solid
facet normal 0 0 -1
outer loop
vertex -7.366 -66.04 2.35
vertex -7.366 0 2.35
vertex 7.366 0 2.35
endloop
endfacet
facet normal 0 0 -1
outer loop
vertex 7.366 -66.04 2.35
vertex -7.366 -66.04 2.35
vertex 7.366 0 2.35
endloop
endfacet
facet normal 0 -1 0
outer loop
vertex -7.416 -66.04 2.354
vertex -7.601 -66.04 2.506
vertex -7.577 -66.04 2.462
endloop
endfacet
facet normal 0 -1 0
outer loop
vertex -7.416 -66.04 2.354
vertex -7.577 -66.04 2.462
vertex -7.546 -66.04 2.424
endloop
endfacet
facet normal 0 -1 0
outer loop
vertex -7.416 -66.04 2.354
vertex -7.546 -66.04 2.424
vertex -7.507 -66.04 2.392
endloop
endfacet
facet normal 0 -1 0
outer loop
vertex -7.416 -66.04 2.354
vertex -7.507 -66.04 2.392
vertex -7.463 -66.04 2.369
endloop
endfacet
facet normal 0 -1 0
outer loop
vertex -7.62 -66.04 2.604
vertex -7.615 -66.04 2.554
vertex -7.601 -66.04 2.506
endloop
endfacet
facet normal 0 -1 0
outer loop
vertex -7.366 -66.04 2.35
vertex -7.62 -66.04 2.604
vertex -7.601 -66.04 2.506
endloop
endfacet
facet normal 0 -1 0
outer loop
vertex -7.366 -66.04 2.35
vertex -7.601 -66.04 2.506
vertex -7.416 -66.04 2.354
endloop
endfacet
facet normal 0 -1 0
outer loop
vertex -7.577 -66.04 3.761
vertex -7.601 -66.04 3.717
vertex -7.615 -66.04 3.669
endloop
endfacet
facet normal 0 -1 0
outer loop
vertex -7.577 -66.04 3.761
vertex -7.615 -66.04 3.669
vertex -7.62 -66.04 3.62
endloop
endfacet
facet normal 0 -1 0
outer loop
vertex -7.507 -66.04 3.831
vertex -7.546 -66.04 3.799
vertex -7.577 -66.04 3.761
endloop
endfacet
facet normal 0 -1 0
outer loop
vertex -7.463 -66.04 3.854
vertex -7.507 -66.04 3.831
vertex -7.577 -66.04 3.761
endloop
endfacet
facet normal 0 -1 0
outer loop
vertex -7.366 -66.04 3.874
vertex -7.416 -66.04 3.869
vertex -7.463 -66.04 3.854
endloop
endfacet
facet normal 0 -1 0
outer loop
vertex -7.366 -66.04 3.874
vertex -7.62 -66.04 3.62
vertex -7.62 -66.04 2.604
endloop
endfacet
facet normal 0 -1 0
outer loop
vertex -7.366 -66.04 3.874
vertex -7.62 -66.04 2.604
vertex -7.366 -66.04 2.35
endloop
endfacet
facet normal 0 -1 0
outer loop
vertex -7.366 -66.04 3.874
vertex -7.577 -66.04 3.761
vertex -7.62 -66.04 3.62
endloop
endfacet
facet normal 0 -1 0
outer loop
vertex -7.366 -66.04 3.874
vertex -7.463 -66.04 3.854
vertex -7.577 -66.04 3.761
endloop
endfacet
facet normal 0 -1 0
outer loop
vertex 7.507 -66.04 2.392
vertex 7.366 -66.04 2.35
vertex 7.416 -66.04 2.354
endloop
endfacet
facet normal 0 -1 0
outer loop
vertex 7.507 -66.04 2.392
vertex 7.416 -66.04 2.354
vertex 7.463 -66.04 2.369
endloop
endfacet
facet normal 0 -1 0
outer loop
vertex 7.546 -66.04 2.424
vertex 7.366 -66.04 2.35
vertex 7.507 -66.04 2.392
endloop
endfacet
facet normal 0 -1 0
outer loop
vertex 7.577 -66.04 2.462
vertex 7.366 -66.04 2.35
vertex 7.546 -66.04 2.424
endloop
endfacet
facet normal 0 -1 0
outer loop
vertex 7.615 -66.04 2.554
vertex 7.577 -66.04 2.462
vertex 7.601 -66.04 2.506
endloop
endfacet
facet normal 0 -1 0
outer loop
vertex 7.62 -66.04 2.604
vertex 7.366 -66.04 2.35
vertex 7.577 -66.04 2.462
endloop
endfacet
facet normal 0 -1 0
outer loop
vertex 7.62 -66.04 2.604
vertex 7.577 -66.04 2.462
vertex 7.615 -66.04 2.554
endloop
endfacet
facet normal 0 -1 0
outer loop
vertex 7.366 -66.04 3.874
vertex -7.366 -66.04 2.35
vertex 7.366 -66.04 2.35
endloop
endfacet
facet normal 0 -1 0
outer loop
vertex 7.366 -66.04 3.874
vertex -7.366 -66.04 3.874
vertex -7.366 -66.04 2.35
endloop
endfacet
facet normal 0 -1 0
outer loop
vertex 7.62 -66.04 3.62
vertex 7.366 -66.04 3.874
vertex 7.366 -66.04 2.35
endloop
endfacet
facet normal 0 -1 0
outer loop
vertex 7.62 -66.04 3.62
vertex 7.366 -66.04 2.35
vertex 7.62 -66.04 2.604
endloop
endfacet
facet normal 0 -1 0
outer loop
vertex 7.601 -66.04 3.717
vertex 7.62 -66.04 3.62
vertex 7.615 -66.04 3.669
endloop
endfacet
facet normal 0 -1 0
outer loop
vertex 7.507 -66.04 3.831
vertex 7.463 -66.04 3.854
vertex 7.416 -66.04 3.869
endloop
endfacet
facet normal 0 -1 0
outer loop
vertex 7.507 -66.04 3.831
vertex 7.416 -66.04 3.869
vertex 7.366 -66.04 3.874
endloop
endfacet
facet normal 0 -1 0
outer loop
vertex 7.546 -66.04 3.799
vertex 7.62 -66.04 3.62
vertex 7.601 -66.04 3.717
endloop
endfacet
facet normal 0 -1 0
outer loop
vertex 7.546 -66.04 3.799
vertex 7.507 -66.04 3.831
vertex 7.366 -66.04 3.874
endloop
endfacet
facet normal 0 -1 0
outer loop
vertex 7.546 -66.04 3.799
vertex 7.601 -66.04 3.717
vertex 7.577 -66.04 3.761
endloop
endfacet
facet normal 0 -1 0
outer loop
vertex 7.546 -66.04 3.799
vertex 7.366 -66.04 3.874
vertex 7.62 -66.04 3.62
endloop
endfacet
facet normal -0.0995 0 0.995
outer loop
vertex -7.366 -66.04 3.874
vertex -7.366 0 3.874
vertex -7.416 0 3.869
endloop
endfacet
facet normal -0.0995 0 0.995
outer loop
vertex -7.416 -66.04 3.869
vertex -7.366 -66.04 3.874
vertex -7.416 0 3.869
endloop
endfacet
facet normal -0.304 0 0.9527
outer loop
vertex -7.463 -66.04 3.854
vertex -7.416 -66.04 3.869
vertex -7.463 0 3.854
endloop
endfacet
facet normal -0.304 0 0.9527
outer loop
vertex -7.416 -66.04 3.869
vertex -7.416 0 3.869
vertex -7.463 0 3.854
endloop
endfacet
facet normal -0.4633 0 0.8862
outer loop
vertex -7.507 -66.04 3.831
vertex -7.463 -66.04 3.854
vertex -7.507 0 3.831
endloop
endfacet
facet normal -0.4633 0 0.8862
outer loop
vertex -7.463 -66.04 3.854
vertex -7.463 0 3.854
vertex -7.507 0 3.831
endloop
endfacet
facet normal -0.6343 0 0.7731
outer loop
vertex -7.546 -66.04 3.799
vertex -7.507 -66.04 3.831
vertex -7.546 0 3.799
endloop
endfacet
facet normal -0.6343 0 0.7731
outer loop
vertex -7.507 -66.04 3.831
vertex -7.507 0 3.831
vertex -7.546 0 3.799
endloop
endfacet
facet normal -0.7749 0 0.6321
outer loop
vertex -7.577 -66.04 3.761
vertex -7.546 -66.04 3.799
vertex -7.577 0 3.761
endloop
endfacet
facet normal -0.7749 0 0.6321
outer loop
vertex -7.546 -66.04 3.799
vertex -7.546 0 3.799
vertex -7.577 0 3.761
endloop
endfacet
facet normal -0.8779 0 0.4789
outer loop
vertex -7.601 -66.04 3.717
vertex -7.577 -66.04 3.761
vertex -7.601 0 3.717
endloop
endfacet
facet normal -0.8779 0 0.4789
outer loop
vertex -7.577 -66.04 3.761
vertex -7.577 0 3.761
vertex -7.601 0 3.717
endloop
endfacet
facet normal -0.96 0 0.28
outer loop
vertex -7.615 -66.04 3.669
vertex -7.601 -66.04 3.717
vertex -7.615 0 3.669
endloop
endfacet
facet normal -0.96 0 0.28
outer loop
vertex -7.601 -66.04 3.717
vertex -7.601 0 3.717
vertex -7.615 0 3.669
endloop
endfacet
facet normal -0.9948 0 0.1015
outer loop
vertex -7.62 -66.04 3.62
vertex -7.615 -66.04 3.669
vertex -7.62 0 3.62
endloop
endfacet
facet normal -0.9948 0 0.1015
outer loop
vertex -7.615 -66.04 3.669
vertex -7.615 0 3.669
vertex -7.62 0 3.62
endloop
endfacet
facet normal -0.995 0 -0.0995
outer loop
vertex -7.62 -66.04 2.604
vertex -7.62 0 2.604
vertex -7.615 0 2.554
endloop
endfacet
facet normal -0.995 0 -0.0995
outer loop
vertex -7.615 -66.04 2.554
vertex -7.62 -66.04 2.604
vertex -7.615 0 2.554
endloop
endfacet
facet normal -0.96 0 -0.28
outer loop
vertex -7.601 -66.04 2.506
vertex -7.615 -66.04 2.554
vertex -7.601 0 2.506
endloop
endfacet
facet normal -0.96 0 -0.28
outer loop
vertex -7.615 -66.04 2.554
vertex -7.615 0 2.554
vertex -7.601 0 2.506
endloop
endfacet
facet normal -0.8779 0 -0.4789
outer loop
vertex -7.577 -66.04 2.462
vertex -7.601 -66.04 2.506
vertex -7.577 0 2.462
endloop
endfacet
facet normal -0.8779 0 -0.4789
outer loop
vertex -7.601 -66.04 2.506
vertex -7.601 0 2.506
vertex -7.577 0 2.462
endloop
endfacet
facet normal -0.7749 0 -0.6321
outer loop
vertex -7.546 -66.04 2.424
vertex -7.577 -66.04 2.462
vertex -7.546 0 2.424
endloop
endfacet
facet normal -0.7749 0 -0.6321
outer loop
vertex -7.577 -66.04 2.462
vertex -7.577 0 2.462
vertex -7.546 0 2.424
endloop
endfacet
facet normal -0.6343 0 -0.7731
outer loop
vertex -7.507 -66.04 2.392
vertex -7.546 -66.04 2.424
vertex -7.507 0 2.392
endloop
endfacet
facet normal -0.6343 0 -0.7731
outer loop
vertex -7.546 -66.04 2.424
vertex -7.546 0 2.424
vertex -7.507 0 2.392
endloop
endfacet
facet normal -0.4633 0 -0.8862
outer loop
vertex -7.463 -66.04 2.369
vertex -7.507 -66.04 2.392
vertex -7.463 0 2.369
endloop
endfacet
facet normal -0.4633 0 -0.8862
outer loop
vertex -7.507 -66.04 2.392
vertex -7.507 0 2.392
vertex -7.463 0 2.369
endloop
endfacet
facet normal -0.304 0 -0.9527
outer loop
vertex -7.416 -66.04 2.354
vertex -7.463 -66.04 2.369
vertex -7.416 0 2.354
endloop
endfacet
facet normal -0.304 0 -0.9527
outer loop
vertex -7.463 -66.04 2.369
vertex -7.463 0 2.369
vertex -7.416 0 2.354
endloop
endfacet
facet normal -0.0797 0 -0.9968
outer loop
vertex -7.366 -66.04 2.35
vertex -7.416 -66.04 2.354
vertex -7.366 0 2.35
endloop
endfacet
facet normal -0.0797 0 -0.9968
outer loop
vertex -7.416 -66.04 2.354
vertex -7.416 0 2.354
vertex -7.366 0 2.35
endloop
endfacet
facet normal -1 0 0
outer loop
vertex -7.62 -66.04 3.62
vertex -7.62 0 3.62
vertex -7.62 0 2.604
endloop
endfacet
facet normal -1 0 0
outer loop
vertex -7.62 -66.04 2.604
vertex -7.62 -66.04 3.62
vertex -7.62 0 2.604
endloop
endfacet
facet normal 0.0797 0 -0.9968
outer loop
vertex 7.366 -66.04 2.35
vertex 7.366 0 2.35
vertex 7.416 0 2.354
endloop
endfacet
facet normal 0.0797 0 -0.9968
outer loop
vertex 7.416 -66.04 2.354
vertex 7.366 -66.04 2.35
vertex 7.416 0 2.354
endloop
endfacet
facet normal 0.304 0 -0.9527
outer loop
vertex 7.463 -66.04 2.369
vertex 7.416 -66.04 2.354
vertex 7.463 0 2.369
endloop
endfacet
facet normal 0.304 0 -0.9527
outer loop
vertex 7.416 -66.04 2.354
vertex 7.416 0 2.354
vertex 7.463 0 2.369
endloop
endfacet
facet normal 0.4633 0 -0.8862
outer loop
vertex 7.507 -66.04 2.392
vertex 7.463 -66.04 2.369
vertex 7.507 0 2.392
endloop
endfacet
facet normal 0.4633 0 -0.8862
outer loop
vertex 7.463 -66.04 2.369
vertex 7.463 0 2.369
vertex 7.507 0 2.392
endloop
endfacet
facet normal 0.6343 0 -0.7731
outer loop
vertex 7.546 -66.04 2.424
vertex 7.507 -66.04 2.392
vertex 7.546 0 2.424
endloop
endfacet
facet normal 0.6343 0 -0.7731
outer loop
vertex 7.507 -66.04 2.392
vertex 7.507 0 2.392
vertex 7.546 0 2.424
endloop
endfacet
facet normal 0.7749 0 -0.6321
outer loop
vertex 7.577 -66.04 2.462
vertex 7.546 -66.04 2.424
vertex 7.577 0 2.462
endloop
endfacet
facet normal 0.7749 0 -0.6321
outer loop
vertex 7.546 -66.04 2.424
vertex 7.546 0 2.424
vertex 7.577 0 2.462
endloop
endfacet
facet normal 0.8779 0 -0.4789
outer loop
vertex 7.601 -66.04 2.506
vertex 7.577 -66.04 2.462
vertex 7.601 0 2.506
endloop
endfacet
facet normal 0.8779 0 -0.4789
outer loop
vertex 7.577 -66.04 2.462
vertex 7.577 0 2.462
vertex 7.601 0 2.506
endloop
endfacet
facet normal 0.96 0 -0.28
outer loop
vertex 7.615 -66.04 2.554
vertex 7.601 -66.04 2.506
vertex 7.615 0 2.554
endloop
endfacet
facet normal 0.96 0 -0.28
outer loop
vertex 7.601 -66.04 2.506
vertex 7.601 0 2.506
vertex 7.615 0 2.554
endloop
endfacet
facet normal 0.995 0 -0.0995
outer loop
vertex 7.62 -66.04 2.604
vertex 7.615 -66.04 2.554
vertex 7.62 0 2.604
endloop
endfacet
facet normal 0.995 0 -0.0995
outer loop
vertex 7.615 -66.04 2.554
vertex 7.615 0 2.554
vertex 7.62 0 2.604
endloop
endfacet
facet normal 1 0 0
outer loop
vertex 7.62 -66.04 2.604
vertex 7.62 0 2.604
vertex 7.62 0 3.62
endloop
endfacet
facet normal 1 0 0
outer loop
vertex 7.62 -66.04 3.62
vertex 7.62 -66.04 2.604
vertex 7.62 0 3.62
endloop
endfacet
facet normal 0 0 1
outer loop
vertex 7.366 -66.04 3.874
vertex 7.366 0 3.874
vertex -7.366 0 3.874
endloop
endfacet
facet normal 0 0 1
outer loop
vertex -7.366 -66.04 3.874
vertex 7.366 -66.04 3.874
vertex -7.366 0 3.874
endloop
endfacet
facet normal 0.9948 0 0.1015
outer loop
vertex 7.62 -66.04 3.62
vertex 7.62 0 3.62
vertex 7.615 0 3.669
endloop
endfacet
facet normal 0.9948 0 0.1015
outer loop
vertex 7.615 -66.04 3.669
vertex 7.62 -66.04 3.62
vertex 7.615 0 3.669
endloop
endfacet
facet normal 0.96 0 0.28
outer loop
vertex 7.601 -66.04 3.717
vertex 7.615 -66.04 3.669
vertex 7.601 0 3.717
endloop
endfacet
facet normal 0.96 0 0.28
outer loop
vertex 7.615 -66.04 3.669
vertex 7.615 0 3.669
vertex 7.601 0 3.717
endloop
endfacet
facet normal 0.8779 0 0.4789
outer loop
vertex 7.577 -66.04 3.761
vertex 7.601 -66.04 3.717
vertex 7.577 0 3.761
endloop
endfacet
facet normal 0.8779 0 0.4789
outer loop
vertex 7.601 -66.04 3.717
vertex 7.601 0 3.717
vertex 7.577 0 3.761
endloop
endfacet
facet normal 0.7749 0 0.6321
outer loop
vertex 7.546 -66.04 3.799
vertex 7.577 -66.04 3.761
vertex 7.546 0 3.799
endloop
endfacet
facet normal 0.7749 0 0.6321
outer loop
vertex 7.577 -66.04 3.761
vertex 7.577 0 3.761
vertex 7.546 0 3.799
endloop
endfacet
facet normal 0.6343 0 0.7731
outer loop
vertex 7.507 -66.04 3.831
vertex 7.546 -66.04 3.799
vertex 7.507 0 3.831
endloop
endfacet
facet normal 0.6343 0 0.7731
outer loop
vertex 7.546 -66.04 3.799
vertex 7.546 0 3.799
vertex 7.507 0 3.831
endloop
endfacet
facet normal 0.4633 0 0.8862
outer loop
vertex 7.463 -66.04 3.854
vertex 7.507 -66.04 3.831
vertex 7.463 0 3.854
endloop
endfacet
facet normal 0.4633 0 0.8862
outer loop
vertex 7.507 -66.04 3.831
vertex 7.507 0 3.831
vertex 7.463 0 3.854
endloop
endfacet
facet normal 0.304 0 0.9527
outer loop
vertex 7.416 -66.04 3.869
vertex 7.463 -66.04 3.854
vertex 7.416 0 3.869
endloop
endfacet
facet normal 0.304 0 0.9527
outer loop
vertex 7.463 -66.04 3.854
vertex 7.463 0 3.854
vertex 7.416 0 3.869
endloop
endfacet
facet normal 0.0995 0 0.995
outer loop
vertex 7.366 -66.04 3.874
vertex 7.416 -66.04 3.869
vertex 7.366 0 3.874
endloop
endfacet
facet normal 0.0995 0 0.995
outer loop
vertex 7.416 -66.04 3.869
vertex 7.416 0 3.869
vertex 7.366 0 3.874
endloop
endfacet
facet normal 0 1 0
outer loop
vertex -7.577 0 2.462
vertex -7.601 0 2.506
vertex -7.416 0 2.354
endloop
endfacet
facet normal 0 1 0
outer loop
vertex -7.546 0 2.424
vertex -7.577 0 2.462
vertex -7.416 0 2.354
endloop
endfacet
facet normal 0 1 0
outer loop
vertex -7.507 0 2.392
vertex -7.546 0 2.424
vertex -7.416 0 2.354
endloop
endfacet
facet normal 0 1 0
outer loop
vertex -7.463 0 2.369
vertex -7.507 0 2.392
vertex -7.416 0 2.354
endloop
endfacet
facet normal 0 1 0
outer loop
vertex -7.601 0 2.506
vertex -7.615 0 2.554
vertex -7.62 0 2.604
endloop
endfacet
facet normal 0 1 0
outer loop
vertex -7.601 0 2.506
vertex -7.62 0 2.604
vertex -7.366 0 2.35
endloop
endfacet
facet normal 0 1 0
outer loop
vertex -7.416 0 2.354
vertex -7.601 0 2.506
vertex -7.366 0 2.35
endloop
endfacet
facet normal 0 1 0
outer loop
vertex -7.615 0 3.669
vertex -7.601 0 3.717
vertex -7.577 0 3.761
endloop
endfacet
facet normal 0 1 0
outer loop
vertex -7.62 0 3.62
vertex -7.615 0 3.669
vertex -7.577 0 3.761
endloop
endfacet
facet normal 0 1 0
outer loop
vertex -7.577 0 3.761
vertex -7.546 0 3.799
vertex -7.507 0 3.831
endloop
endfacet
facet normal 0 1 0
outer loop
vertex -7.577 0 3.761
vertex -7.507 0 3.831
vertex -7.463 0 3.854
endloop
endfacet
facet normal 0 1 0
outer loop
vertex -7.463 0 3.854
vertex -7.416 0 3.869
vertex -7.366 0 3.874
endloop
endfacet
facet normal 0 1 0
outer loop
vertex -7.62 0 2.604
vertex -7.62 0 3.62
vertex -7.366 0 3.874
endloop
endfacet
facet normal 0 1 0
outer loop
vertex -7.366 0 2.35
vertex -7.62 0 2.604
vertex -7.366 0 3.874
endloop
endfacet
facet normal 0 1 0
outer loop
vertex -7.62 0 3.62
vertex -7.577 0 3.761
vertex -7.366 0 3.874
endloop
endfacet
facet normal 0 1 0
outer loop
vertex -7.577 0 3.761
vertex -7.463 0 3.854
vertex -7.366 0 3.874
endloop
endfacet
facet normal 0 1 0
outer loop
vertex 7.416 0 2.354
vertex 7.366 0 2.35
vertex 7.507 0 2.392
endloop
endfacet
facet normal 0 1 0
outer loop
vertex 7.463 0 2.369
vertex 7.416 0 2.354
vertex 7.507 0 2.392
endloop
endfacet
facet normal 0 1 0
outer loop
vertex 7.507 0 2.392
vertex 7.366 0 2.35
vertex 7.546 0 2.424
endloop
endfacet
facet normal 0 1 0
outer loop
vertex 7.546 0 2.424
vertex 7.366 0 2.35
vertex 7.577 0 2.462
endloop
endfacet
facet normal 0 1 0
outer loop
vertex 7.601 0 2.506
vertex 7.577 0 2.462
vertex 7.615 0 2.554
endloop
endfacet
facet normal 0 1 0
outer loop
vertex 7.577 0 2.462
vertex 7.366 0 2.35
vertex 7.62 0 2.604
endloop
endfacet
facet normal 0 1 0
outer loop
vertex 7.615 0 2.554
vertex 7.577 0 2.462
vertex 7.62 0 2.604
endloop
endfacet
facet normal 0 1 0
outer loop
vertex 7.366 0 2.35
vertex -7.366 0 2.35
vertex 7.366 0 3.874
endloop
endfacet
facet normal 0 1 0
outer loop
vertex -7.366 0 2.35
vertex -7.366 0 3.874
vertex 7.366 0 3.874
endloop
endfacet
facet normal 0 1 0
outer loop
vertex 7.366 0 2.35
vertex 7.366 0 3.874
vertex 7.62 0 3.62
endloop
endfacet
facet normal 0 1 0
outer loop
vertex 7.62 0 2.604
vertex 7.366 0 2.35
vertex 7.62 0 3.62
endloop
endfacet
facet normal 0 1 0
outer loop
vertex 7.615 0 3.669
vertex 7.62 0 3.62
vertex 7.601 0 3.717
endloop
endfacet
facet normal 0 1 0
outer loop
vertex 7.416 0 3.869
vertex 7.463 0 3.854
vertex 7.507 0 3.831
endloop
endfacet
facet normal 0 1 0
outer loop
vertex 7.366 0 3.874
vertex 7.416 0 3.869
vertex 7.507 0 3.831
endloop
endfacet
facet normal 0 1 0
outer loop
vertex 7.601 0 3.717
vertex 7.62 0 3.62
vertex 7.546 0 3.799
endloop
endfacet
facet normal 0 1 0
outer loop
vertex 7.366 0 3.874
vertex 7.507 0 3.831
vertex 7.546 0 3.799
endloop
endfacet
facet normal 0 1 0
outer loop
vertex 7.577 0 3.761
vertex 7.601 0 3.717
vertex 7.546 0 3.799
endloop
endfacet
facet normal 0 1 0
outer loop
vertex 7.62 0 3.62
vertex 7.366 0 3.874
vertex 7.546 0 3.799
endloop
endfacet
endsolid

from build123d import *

# Parameters (mm, degrees)
F1_DEPTH = 66.04


with BuildPart() as f1:
    # F0 (on Front) → F1 (new body)
    with BuildSketch(Plane.XZ):
        with BuildLine():
            ThreePointArc((-7.366, 3.8735), (-7.545605, 3.799105), (-7.62, 3.6195))
            Line((-7.62, 3.6195), (-7.62, 2.6035))
            ThreePointArc((-7.62, 2.6035), (-7.545605, 2.423895), (-7.366, 2.3495))
            Line((-7.366, 2.3495), (0, 2.3495))
            Line((0, 2.3495), (7.366, 2.3495))
            ThreePointArc((7.366, 2.3495), (7.545605, 2.423895), (7.62, 2.6035))
            Line((7.62, 2.6035), (7.62, 3.6195))
            ThreePointArc((7.62, 3.6195), (7.545605, 3.799105), (7.366, 3.8735))
            Line((7.366, 3.8735), (0, 3.8735))
            Line((0, 3.8735), (-7.366, 3.8735))
        make_face()
    extrude(amount=F1_DEPTH)


solid = f1.part
